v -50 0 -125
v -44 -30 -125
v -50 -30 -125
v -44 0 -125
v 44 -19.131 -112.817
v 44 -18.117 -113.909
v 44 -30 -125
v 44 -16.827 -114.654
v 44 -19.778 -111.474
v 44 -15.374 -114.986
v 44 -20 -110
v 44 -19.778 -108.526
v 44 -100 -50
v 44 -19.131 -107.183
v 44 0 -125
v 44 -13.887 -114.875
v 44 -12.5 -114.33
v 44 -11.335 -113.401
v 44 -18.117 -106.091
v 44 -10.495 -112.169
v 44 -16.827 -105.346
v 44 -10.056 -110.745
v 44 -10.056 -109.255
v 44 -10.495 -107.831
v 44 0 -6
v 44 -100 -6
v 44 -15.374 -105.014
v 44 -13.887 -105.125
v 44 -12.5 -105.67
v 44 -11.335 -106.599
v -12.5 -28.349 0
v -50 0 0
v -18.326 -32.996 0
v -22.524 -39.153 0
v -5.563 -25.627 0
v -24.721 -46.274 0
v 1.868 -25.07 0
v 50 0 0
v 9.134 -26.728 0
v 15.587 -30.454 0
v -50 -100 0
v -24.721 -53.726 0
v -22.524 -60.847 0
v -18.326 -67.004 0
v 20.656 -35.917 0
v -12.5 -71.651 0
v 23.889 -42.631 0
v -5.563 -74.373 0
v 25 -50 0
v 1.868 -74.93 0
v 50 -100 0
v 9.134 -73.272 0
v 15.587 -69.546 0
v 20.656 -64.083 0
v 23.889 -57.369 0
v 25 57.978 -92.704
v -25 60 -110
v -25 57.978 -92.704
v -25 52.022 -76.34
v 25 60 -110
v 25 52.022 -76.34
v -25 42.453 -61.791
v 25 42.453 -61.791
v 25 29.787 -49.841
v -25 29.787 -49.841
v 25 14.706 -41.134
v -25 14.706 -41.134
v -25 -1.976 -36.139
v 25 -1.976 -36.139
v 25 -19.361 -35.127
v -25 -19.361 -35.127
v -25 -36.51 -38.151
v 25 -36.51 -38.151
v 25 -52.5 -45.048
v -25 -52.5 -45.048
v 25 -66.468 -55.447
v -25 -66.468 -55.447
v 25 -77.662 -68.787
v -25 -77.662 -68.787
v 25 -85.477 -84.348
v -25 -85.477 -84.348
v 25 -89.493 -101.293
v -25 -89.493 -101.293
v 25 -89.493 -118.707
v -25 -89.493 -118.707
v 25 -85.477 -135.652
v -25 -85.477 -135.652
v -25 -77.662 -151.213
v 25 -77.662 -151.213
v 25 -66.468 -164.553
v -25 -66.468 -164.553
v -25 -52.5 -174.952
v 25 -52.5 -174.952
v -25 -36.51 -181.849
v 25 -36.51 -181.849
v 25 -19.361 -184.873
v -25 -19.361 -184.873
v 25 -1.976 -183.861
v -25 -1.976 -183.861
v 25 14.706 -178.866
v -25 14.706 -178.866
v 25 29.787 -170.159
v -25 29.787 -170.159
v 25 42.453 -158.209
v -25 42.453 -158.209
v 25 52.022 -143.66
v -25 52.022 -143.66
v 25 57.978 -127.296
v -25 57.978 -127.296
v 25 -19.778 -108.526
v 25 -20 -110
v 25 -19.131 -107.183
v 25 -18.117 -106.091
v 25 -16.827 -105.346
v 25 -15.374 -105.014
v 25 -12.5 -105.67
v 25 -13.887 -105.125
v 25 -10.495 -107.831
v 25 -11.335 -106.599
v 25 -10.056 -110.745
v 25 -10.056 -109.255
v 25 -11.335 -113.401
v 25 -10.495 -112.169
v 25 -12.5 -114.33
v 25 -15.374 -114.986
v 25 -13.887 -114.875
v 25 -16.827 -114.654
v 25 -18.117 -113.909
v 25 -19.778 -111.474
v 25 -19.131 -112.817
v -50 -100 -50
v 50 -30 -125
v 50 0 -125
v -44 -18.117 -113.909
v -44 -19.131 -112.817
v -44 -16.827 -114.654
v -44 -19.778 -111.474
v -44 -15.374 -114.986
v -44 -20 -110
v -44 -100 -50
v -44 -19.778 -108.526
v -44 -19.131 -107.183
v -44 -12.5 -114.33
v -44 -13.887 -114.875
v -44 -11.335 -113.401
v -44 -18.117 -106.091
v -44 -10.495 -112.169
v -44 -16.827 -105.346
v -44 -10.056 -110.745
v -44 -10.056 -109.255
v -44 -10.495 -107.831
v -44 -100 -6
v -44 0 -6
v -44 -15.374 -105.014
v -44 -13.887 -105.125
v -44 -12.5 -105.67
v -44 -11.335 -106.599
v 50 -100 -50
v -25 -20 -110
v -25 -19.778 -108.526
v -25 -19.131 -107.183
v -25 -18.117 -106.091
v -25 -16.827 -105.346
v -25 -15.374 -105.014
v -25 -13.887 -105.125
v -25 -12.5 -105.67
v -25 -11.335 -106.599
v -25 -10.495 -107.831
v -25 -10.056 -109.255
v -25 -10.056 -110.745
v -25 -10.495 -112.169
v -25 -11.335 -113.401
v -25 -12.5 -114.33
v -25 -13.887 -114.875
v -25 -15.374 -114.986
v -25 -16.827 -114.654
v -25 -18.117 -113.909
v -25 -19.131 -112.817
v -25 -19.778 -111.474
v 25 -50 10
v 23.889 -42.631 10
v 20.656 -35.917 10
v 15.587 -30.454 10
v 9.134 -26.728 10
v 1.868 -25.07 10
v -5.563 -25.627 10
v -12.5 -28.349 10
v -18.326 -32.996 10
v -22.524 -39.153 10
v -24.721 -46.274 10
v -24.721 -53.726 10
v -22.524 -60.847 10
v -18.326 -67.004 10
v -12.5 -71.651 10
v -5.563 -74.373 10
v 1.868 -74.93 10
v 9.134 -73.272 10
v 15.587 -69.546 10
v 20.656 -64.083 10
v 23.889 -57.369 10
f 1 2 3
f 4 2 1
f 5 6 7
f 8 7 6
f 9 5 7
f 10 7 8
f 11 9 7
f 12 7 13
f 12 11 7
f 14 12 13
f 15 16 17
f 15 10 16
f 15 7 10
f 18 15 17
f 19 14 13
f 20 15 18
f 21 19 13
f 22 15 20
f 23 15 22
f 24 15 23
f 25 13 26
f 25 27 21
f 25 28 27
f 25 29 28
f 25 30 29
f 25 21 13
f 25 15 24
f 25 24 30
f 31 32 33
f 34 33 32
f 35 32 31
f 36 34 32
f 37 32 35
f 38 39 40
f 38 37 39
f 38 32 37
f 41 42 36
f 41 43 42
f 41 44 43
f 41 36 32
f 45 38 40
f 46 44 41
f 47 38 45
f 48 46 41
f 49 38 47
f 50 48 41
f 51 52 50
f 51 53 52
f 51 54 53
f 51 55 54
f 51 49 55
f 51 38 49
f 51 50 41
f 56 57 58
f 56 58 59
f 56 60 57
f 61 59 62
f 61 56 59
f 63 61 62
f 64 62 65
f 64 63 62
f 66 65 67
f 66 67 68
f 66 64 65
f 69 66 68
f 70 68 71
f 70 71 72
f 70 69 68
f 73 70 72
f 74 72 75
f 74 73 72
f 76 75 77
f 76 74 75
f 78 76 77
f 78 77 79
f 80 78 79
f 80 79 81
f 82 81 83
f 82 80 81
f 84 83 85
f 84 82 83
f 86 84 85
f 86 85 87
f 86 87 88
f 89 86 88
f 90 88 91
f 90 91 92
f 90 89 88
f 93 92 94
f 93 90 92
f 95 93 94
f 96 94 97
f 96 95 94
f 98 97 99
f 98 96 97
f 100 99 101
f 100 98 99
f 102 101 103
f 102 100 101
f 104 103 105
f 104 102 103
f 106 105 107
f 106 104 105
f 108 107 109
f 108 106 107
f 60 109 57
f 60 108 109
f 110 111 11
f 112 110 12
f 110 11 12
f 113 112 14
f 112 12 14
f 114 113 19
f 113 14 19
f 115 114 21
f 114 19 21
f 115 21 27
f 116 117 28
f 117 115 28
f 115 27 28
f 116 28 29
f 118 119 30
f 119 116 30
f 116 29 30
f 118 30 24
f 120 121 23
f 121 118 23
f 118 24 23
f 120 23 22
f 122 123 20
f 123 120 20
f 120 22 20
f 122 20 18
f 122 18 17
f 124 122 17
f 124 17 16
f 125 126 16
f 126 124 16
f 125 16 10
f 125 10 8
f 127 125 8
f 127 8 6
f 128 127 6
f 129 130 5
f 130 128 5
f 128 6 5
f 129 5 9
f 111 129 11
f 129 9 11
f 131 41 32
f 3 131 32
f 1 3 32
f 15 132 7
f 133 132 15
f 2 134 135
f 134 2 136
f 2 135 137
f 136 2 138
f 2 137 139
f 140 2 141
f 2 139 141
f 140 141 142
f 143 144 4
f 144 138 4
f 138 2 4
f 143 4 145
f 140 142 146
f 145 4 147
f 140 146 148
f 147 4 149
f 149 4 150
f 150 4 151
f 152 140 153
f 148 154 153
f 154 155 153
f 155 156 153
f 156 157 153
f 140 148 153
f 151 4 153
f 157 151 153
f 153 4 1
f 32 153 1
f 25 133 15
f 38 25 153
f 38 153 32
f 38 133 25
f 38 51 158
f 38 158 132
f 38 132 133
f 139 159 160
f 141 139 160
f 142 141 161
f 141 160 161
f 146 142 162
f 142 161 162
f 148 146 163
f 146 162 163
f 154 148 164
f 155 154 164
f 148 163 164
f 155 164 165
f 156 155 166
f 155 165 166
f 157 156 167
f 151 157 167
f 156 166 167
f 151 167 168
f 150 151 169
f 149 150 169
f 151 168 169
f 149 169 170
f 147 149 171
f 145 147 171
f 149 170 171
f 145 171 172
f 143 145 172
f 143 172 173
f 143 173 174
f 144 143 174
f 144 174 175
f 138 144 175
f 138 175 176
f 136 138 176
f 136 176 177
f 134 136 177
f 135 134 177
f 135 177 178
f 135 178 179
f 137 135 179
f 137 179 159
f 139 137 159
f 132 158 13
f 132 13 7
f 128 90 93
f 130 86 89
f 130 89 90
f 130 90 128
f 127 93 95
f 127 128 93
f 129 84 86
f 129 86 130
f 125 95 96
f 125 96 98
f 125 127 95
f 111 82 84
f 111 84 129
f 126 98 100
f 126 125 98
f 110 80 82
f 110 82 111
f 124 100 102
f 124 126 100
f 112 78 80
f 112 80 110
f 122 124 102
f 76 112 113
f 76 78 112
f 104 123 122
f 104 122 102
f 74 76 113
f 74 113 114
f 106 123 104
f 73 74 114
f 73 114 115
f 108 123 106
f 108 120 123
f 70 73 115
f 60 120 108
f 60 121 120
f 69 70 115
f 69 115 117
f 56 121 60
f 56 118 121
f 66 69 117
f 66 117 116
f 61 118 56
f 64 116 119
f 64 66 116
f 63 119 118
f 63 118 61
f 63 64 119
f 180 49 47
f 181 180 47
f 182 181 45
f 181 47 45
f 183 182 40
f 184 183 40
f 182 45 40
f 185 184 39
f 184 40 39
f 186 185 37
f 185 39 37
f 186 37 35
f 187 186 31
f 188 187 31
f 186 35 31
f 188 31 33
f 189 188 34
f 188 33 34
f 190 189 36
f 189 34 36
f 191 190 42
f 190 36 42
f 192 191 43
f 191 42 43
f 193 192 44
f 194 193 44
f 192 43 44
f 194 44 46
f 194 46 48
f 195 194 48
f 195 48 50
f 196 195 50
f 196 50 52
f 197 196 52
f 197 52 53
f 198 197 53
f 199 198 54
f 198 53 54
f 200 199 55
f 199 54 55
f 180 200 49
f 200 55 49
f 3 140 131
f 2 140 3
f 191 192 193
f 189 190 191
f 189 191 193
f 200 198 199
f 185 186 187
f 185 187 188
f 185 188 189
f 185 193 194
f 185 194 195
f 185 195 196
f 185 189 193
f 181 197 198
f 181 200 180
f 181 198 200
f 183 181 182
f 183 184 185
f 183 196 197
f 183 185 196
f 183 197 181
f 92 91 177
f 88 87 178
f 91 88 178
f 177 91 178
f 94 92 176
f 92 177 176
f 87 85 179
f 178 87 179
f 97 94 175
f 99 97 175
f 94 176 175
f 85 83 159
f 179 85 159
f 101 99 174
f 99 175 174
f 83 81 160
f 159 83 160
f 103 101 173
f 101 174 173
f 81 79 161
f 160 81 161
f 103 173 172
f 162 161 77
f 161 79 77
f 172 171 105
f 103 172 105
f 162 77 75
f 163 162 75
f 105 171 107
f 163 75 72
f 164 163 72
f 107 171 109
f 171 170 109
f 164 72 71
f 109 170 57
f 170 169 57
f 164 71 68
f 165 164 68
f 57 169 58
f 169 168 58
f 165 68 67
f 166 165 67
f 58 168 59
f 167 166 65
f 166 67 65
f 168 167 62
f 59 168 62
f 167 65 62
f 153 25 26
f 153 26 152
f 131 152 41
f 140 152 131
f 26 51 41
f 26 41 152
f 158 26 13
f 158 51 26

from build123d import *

# Parameters (mm, degrees)
F1_DEPTH = 50
F2_W     = 88
F2_H     = 119
F3_DEPTH = 100.001
F4_R     = 5
F5_DEPTH = 88
F6_R     = 25
F7_DEPTH = 10
F8_R     = 75
F9_DEPTH = 25


with BuildPart() as f1:
    # F0 (on Right) → F1 (new body, symmetric)
    with BuildSketch(Plane.YZ):
        Polygon((0, -125), (0, 0), (-100, 0), (-100, -50), (-30, -125), align=None)
    extrude(amount=F1_DEPTH, both=True)

    # F2 (on face) → F3 (cut, through all)
    with BuildSketch(Plane(origin=(0, 0, 0), x_dir=(-1, 0, 0), z_dir=(0, 1, 0))):
        with Locations((0, -65.5)):
            Rectangle(F2_W, F2_H)
    extrude(amount=-F3_DEPTH, mode=Mode.SUBTRACT)

    # F4 (on face) → F5 (join, through all)
    with BuildSketch(Plane(origin=(44, 0, 0), x_dir=(0, -1, 0), z_dir=(-1, 0, 0))):
        with Locations((15, -110)):
            Circle(F4_R)
    extrude(amount=F5_DEPTH)

    # F6 (on face) → F7 (join)
    with BuildSketch(Plane.XY):
        with Locations((0, -50)):
            Circle(F6_R)
    extrude(amount=F7_DEPTH)

    # F8 (on Right) → F9 (join, symmetric)
    with BuildSketch(Plane.YZ):
        with Locations((-15, -110)):
            Circle(F8_R)
    extrude(amount=F9_DEPTH, both=True)


solid = f1.part
